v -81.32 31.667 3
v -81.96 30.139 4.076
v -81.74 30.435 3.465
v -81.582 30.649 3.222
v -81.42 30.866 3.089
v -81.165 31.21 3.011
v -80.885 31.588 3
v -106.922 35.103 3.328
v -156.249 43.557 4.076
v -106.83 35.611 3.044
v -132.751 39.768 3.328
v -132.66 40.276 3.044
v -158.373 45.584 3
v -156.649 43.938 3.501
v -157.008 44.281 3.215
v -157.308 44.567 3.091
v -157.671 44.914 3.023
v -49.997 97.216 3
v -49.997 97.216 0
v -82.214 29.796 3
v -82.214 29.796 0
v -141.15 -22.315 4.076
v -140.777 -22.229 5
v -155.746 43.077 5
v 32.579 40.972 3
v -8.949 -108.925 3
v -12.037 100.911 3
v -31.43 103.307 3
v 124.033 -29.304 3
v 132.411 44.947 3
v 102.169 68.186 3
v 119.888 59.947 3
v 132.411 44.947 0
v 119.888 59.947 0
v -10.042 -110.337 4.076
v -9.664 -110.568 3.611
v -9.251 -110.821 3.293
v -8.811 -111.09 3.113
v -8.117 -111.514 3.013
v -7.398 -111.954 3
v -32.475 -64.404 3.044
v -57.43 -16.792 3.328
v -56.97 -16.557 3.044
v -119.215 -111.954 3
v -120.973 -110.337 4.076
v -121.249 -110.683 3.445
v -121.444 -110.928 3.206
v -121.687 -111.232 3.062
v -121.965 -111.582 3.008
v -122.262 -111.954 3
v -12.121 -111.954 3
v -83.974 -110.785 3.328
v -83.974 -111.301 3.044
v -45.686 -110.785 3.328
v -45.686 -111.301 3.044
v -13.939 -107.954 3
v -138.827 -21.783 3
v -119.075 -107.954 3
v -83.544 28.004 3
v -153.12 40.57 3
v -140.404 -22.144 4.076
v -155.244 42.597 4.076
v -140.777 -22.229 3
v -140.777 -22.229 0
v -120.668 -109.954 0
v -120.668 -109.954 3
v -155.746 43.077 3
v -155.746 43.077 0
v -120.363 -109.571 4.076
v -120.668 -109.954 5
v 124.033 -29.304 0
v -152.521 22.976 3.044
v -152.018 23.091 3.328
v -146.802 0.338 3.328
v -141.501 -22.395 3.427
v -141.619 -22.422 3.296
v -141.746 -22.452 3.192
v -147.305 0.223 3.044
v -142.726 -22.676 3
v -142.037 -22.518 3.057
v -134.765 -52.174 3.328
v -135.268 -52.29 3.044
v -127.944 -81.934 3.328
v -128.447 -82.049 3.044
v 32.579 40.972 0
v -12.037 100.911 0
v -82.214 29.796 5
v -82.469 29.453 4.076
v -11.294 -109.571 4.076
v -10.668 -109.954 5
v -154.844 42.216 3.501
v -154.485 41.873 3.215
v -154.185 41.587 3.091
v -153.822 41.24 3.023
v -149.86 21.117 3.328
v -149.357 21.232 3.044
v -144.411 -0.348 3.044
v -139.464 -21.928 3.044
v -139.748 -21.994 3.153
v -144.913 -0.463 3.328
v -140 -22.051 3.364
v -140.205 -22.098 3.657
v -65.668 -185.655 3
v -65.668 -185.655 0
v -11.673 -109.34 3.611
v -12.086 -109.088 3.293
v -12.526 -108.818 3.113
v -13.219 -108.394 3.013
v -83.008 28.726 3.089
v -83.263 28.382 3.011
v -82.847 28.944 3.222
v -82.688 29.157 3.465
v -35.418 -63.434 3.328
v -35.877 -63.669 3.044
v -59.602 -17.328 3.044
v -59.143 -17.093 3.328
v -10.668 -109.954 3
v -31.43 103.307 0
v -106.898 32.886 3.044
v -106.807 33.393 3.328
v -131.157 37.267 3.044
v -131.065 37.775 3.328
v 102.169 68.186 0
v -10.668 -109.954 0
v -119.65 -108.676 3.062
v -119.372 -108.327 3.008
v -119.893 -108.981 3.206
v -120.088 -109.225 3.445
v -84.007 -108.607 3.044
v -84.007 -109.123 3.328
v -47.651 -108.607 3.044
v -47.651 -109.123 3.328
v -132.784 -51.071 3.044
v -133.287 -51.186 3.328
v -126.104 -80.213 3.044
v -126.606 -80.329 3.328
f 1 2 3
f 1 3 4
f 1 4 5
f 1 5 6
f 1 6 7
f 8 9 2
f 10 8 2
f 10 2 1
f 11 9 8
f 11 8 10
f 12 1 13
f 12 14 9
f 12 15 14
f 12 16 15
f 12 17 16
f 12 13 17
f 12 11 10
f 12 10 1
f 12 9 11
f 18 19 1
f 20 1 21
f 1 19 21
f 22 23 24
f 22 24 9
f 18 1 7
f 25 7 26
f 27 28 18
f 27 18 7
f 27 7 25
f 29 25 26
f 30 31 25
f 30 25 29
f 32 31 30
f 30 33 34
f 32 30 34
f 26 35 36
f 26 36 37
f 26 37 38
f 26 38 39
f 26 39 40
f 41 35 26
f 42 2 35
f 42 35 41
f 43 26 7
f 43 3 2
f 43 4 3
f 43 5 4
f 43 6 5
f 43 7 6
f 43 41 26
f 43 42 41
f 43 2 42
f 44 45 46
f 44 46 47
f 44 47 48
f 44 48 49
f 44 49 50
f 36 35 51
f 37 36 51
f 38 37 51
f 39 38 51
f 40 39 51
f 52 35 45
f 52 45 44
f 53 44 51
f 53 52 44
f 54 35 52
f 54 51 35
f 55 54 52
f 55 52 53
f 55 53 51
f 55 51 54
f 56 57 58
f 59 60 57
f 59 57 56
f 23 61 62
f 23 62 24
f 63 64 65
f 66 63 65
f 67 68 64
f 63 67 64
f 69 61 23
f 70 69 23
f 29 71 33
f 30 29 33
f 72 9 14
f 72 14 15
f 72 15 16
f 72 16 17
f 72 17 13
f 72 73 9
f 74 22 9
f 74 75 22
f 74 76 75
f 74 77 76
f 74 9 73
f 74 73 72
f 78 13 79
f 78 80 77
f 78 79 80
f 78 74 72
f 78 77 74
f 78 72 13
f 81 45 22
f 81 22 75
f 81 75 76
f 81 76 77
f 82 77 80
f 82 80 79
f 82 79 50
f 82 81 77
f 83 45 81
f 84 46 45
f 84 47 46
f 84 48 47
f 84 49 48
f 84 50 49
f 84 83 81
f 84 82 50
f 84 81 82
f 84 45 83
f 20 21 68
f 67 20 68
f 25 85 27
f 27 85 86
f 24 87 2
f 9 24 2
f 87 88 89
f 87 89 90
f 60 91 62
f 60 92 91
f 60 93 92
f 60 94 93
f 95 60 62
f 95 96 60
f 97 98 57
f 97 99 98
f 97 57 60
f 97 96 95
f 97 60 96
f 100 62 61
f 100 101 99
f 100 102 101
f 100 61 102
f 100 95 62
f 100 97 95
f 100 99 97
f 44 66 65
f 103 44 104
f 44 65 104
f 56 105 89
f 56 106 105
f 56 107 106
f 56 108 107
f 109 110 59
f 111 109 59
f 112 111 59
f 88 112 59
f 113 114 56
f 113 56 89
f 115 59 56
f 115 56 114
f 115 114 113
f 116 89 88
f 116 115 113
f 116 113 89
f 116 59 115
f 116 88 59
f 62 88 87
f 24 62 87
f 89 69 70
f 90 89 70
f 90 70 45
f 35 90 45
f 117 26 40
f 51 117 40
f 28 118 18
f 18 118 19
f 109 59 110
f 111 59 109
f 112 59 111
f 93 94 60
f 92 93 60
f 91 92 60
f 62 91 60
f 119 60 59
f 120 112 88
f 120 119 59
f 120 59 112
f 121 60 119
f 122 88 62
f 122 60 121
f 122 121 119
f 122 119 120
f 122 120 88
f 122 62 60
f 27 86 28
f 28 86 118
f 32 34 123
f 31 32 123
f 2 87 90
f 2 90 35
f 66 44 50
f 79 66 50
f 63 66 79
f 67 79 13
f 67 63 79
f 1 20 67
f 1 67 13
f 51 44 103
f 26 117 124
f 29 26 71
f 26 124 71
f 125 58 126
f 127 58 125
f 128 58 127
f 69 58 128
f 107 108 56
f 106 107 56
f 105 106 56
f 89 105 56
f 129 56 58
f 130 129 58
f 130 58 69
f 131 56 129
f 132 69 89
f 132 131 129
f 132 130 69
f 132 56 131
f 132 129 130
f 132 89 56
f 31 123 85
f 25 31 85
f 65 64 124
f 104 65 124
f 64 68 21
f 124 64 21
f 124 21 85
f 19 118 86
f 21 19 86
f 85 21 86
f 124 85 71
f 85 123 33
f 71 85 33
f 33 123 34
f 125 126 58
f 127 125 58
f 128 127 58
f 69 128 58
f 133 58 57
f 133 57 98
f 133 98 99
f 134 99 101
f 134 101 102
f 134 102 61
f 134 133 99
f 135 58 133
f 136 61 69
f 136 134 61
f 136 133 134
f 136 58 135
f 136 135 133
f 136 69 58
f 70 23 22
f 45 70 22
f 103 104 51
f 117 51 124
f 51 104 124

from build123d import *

# Parameters (mm, degrees)
F1_DEPTH = 3


# Not quite as in the source:
# - a feature names something its author has since deleted; it is built from what else it names


with BuildPart() as f1:
    # F0 (on Top) → F1 (new body)
    with BuildSketch(Plane.XY):
        Polygon((-28.4502197635, 72.6983953348), (-51.6819700906, -29.8425633773), (-23.1152368132, 17.8982210566), align=None)
        Polygon((-140.7768225768, -22.2294077159), (-10.6683637709, -109.9542610041), (-51.6819700906, -29.8425633773), align=None)
        Polygon((-51.6819700906, -29.8425633773), (-10.6683637709, -109.9542610041), (-23.1152368132, 17.8982210566), align=None)
        Polygon((-10.6683637709, -109.9542610041), (-120.6683637709, -109.9542610041), (-65.6683637709, -185.6552666301), align=None)
        Polygon((132.4114346114, 44.946839524), (66.5490740882, -63.721509729), (124.0331667167, -29.3037948908), align=None)
        Polygon((-140.7768225768, -22.2294077159), (-120.6683637709, -109.9542610041), (-10.6683637709, -109.9542610041), align=None)
        Polygon((-155.7464530213, 43.0768719543), (-140.7768225768, -22.2294077159), (-51.6819700906, -29.8425633773), align=None)
        Polygon((-155.7464530213, 43.0768719543), (-51.6819700906, -29.8425633773), (-82.214321462, 29.796144856), align=None)
        Polygon((-82.214321462, 29.796144856), (-51.6819700906, -29.8425633773), (-49.9971651586, 97.2157779285), align=None)
        Polygon((67.6016469638, -8.0965797169), (-10.6683637709, -109.9542610041), (66.5490740882, -63.721509729), align=None)
        Polygon((-31.4300453332, 103.3067331799), (-49.9971651586, 97.2157779285), (-28.4502197635, 72.6983953348), align=None)
        Polygon((-31.4300453332, 103.3067331799), (-28.4502197635, 72.6983953348), (-12.0367519986, 100.9113529511), align=None)
        Polygon((-12.0367519508, 100.9113529867), (14.1232700197, -23.4361999186), (32.5792640638, 40.9716900005), align=None)
        Polygon((119.8878838282, 59.9467845327), (101.1497655445, 35.5616942262), (132.4114345522, 44.9468395307), align=None)
        Polygon((102.1690833879, 68.1858247536), (101.1497655445, 35.5616942262), (119.8878838282, 59.9467845327), align=None)
        Polygon((32.5792640638, 40.9716900005), (14.1232700197, -23.4361999186), (102.1690833662, 68.185824809), align=None)
        Polygon((-49.9971651586, 97.2157779285), (-51.6819700906, -29.8425633773), (-28.4502197635, 72.6983953348), align=None)
        Polygon((-28.4502197635, 72.6983953348), (-23.1152368132, 17.8982210566), (14.1232700197, -23.4361999186), align=None)
        Polygon((-23.1152368132, 17.8982210566), (-10.6683637709, -109.9542610041), (14.1232700197, -23.4361999186), align=None)
        Polygon((-28.4502197635, 72.6983953348), (14.1232700197, -23.4361999186), (-12.0367519508, 100.9113529867), align=None)
        Polygon((14.1232700197, -23.4361999186), (-10.6683637709, -109.9542610041), (67.6016469638, -8.0965797169), align=None)
        Polygon((102.1690833662, 68.185824809), (14.1232700197, -23.4361999186), (101.1497655445, 35.5616942262), align=None)
        Polygon((101.1497655445, 35.5616942262), (66.5490740882, -63.721509729), (132.4114346114, 44.946839524), align=None)
        Polygon((67.6016469638, -8.0965797169), (66.5490740882, -63.721509729), (101.1497655445, 35.5616942262), align=None)
        Polygon((101.1497655445, 35.5616942262), (14.1232700197, -23.4361999186), (67.6016469638, -8.0965797169), align=None)
    extrude(amount=F1_DEPTH)

    # F6: sweep along a path in F2
    with BuildLine(Plane.XY.offset(3)) as f6_path:
        Line((-10.6683637709, -109.9542610041), (-51.6819700906, -29.8425633773))
        Line((-51.6819700906, -29.8425633773), (-82.214321462, 29.796144856))
        Line((-82.214321462, 29.796144856), (-155.7464530213, 43.0768719543))
        Line((-155.7464530213, 43.0768719543), (-140.7768225768, -22.2294077159))
        Line((-140.7768225768, -22.2294077159), (-120.6683637709, -109.9542610041))
        Line((-120.6683637709, -109.9542610041), (-10.6683637709, -109.9542610041))
    # F5 (on plane+point) → F6 (sweep)
    with BuildSketch(Plane.YZ.offset(-120.6683637709)):
        with BuildLine():
            Line((-111.9542610041, 3), (-107.9542610041, 3))
            add(Edge.make_bspline(
                [(-107.9542610041, 3), (-108.6989912072, 3), (-109.1337455213, 3.0200950451), (-109.5714134942, 4.0761884477)],
                knots=[0, 0, 0, 0, 1.9425148007, 1.9425148007, 1.9425148007, 1.9425148007], degree=3))
            Line((-109.5714134942, 4.0761884477), (-109.9542610041, 5))
            Line((-109.9542610041, 5), (-110.3371085141, 4.0761884477))
            add(Edge.make_bspline(
                [(-111.9542610041, 3), (-111.2095308011, 3), (-110.774776487, 3.0200950451), (-110.3371085141, 4.0761884477)],
                knots=[0, 0, 0, 0, 1.9425148007, 1.9425148007, 1.9425148007, 1.9425148007], degree=3))
        make_face()
    sweep(path=f6_path.line, transition=Transition.RIGHT)


solid = f1.part
